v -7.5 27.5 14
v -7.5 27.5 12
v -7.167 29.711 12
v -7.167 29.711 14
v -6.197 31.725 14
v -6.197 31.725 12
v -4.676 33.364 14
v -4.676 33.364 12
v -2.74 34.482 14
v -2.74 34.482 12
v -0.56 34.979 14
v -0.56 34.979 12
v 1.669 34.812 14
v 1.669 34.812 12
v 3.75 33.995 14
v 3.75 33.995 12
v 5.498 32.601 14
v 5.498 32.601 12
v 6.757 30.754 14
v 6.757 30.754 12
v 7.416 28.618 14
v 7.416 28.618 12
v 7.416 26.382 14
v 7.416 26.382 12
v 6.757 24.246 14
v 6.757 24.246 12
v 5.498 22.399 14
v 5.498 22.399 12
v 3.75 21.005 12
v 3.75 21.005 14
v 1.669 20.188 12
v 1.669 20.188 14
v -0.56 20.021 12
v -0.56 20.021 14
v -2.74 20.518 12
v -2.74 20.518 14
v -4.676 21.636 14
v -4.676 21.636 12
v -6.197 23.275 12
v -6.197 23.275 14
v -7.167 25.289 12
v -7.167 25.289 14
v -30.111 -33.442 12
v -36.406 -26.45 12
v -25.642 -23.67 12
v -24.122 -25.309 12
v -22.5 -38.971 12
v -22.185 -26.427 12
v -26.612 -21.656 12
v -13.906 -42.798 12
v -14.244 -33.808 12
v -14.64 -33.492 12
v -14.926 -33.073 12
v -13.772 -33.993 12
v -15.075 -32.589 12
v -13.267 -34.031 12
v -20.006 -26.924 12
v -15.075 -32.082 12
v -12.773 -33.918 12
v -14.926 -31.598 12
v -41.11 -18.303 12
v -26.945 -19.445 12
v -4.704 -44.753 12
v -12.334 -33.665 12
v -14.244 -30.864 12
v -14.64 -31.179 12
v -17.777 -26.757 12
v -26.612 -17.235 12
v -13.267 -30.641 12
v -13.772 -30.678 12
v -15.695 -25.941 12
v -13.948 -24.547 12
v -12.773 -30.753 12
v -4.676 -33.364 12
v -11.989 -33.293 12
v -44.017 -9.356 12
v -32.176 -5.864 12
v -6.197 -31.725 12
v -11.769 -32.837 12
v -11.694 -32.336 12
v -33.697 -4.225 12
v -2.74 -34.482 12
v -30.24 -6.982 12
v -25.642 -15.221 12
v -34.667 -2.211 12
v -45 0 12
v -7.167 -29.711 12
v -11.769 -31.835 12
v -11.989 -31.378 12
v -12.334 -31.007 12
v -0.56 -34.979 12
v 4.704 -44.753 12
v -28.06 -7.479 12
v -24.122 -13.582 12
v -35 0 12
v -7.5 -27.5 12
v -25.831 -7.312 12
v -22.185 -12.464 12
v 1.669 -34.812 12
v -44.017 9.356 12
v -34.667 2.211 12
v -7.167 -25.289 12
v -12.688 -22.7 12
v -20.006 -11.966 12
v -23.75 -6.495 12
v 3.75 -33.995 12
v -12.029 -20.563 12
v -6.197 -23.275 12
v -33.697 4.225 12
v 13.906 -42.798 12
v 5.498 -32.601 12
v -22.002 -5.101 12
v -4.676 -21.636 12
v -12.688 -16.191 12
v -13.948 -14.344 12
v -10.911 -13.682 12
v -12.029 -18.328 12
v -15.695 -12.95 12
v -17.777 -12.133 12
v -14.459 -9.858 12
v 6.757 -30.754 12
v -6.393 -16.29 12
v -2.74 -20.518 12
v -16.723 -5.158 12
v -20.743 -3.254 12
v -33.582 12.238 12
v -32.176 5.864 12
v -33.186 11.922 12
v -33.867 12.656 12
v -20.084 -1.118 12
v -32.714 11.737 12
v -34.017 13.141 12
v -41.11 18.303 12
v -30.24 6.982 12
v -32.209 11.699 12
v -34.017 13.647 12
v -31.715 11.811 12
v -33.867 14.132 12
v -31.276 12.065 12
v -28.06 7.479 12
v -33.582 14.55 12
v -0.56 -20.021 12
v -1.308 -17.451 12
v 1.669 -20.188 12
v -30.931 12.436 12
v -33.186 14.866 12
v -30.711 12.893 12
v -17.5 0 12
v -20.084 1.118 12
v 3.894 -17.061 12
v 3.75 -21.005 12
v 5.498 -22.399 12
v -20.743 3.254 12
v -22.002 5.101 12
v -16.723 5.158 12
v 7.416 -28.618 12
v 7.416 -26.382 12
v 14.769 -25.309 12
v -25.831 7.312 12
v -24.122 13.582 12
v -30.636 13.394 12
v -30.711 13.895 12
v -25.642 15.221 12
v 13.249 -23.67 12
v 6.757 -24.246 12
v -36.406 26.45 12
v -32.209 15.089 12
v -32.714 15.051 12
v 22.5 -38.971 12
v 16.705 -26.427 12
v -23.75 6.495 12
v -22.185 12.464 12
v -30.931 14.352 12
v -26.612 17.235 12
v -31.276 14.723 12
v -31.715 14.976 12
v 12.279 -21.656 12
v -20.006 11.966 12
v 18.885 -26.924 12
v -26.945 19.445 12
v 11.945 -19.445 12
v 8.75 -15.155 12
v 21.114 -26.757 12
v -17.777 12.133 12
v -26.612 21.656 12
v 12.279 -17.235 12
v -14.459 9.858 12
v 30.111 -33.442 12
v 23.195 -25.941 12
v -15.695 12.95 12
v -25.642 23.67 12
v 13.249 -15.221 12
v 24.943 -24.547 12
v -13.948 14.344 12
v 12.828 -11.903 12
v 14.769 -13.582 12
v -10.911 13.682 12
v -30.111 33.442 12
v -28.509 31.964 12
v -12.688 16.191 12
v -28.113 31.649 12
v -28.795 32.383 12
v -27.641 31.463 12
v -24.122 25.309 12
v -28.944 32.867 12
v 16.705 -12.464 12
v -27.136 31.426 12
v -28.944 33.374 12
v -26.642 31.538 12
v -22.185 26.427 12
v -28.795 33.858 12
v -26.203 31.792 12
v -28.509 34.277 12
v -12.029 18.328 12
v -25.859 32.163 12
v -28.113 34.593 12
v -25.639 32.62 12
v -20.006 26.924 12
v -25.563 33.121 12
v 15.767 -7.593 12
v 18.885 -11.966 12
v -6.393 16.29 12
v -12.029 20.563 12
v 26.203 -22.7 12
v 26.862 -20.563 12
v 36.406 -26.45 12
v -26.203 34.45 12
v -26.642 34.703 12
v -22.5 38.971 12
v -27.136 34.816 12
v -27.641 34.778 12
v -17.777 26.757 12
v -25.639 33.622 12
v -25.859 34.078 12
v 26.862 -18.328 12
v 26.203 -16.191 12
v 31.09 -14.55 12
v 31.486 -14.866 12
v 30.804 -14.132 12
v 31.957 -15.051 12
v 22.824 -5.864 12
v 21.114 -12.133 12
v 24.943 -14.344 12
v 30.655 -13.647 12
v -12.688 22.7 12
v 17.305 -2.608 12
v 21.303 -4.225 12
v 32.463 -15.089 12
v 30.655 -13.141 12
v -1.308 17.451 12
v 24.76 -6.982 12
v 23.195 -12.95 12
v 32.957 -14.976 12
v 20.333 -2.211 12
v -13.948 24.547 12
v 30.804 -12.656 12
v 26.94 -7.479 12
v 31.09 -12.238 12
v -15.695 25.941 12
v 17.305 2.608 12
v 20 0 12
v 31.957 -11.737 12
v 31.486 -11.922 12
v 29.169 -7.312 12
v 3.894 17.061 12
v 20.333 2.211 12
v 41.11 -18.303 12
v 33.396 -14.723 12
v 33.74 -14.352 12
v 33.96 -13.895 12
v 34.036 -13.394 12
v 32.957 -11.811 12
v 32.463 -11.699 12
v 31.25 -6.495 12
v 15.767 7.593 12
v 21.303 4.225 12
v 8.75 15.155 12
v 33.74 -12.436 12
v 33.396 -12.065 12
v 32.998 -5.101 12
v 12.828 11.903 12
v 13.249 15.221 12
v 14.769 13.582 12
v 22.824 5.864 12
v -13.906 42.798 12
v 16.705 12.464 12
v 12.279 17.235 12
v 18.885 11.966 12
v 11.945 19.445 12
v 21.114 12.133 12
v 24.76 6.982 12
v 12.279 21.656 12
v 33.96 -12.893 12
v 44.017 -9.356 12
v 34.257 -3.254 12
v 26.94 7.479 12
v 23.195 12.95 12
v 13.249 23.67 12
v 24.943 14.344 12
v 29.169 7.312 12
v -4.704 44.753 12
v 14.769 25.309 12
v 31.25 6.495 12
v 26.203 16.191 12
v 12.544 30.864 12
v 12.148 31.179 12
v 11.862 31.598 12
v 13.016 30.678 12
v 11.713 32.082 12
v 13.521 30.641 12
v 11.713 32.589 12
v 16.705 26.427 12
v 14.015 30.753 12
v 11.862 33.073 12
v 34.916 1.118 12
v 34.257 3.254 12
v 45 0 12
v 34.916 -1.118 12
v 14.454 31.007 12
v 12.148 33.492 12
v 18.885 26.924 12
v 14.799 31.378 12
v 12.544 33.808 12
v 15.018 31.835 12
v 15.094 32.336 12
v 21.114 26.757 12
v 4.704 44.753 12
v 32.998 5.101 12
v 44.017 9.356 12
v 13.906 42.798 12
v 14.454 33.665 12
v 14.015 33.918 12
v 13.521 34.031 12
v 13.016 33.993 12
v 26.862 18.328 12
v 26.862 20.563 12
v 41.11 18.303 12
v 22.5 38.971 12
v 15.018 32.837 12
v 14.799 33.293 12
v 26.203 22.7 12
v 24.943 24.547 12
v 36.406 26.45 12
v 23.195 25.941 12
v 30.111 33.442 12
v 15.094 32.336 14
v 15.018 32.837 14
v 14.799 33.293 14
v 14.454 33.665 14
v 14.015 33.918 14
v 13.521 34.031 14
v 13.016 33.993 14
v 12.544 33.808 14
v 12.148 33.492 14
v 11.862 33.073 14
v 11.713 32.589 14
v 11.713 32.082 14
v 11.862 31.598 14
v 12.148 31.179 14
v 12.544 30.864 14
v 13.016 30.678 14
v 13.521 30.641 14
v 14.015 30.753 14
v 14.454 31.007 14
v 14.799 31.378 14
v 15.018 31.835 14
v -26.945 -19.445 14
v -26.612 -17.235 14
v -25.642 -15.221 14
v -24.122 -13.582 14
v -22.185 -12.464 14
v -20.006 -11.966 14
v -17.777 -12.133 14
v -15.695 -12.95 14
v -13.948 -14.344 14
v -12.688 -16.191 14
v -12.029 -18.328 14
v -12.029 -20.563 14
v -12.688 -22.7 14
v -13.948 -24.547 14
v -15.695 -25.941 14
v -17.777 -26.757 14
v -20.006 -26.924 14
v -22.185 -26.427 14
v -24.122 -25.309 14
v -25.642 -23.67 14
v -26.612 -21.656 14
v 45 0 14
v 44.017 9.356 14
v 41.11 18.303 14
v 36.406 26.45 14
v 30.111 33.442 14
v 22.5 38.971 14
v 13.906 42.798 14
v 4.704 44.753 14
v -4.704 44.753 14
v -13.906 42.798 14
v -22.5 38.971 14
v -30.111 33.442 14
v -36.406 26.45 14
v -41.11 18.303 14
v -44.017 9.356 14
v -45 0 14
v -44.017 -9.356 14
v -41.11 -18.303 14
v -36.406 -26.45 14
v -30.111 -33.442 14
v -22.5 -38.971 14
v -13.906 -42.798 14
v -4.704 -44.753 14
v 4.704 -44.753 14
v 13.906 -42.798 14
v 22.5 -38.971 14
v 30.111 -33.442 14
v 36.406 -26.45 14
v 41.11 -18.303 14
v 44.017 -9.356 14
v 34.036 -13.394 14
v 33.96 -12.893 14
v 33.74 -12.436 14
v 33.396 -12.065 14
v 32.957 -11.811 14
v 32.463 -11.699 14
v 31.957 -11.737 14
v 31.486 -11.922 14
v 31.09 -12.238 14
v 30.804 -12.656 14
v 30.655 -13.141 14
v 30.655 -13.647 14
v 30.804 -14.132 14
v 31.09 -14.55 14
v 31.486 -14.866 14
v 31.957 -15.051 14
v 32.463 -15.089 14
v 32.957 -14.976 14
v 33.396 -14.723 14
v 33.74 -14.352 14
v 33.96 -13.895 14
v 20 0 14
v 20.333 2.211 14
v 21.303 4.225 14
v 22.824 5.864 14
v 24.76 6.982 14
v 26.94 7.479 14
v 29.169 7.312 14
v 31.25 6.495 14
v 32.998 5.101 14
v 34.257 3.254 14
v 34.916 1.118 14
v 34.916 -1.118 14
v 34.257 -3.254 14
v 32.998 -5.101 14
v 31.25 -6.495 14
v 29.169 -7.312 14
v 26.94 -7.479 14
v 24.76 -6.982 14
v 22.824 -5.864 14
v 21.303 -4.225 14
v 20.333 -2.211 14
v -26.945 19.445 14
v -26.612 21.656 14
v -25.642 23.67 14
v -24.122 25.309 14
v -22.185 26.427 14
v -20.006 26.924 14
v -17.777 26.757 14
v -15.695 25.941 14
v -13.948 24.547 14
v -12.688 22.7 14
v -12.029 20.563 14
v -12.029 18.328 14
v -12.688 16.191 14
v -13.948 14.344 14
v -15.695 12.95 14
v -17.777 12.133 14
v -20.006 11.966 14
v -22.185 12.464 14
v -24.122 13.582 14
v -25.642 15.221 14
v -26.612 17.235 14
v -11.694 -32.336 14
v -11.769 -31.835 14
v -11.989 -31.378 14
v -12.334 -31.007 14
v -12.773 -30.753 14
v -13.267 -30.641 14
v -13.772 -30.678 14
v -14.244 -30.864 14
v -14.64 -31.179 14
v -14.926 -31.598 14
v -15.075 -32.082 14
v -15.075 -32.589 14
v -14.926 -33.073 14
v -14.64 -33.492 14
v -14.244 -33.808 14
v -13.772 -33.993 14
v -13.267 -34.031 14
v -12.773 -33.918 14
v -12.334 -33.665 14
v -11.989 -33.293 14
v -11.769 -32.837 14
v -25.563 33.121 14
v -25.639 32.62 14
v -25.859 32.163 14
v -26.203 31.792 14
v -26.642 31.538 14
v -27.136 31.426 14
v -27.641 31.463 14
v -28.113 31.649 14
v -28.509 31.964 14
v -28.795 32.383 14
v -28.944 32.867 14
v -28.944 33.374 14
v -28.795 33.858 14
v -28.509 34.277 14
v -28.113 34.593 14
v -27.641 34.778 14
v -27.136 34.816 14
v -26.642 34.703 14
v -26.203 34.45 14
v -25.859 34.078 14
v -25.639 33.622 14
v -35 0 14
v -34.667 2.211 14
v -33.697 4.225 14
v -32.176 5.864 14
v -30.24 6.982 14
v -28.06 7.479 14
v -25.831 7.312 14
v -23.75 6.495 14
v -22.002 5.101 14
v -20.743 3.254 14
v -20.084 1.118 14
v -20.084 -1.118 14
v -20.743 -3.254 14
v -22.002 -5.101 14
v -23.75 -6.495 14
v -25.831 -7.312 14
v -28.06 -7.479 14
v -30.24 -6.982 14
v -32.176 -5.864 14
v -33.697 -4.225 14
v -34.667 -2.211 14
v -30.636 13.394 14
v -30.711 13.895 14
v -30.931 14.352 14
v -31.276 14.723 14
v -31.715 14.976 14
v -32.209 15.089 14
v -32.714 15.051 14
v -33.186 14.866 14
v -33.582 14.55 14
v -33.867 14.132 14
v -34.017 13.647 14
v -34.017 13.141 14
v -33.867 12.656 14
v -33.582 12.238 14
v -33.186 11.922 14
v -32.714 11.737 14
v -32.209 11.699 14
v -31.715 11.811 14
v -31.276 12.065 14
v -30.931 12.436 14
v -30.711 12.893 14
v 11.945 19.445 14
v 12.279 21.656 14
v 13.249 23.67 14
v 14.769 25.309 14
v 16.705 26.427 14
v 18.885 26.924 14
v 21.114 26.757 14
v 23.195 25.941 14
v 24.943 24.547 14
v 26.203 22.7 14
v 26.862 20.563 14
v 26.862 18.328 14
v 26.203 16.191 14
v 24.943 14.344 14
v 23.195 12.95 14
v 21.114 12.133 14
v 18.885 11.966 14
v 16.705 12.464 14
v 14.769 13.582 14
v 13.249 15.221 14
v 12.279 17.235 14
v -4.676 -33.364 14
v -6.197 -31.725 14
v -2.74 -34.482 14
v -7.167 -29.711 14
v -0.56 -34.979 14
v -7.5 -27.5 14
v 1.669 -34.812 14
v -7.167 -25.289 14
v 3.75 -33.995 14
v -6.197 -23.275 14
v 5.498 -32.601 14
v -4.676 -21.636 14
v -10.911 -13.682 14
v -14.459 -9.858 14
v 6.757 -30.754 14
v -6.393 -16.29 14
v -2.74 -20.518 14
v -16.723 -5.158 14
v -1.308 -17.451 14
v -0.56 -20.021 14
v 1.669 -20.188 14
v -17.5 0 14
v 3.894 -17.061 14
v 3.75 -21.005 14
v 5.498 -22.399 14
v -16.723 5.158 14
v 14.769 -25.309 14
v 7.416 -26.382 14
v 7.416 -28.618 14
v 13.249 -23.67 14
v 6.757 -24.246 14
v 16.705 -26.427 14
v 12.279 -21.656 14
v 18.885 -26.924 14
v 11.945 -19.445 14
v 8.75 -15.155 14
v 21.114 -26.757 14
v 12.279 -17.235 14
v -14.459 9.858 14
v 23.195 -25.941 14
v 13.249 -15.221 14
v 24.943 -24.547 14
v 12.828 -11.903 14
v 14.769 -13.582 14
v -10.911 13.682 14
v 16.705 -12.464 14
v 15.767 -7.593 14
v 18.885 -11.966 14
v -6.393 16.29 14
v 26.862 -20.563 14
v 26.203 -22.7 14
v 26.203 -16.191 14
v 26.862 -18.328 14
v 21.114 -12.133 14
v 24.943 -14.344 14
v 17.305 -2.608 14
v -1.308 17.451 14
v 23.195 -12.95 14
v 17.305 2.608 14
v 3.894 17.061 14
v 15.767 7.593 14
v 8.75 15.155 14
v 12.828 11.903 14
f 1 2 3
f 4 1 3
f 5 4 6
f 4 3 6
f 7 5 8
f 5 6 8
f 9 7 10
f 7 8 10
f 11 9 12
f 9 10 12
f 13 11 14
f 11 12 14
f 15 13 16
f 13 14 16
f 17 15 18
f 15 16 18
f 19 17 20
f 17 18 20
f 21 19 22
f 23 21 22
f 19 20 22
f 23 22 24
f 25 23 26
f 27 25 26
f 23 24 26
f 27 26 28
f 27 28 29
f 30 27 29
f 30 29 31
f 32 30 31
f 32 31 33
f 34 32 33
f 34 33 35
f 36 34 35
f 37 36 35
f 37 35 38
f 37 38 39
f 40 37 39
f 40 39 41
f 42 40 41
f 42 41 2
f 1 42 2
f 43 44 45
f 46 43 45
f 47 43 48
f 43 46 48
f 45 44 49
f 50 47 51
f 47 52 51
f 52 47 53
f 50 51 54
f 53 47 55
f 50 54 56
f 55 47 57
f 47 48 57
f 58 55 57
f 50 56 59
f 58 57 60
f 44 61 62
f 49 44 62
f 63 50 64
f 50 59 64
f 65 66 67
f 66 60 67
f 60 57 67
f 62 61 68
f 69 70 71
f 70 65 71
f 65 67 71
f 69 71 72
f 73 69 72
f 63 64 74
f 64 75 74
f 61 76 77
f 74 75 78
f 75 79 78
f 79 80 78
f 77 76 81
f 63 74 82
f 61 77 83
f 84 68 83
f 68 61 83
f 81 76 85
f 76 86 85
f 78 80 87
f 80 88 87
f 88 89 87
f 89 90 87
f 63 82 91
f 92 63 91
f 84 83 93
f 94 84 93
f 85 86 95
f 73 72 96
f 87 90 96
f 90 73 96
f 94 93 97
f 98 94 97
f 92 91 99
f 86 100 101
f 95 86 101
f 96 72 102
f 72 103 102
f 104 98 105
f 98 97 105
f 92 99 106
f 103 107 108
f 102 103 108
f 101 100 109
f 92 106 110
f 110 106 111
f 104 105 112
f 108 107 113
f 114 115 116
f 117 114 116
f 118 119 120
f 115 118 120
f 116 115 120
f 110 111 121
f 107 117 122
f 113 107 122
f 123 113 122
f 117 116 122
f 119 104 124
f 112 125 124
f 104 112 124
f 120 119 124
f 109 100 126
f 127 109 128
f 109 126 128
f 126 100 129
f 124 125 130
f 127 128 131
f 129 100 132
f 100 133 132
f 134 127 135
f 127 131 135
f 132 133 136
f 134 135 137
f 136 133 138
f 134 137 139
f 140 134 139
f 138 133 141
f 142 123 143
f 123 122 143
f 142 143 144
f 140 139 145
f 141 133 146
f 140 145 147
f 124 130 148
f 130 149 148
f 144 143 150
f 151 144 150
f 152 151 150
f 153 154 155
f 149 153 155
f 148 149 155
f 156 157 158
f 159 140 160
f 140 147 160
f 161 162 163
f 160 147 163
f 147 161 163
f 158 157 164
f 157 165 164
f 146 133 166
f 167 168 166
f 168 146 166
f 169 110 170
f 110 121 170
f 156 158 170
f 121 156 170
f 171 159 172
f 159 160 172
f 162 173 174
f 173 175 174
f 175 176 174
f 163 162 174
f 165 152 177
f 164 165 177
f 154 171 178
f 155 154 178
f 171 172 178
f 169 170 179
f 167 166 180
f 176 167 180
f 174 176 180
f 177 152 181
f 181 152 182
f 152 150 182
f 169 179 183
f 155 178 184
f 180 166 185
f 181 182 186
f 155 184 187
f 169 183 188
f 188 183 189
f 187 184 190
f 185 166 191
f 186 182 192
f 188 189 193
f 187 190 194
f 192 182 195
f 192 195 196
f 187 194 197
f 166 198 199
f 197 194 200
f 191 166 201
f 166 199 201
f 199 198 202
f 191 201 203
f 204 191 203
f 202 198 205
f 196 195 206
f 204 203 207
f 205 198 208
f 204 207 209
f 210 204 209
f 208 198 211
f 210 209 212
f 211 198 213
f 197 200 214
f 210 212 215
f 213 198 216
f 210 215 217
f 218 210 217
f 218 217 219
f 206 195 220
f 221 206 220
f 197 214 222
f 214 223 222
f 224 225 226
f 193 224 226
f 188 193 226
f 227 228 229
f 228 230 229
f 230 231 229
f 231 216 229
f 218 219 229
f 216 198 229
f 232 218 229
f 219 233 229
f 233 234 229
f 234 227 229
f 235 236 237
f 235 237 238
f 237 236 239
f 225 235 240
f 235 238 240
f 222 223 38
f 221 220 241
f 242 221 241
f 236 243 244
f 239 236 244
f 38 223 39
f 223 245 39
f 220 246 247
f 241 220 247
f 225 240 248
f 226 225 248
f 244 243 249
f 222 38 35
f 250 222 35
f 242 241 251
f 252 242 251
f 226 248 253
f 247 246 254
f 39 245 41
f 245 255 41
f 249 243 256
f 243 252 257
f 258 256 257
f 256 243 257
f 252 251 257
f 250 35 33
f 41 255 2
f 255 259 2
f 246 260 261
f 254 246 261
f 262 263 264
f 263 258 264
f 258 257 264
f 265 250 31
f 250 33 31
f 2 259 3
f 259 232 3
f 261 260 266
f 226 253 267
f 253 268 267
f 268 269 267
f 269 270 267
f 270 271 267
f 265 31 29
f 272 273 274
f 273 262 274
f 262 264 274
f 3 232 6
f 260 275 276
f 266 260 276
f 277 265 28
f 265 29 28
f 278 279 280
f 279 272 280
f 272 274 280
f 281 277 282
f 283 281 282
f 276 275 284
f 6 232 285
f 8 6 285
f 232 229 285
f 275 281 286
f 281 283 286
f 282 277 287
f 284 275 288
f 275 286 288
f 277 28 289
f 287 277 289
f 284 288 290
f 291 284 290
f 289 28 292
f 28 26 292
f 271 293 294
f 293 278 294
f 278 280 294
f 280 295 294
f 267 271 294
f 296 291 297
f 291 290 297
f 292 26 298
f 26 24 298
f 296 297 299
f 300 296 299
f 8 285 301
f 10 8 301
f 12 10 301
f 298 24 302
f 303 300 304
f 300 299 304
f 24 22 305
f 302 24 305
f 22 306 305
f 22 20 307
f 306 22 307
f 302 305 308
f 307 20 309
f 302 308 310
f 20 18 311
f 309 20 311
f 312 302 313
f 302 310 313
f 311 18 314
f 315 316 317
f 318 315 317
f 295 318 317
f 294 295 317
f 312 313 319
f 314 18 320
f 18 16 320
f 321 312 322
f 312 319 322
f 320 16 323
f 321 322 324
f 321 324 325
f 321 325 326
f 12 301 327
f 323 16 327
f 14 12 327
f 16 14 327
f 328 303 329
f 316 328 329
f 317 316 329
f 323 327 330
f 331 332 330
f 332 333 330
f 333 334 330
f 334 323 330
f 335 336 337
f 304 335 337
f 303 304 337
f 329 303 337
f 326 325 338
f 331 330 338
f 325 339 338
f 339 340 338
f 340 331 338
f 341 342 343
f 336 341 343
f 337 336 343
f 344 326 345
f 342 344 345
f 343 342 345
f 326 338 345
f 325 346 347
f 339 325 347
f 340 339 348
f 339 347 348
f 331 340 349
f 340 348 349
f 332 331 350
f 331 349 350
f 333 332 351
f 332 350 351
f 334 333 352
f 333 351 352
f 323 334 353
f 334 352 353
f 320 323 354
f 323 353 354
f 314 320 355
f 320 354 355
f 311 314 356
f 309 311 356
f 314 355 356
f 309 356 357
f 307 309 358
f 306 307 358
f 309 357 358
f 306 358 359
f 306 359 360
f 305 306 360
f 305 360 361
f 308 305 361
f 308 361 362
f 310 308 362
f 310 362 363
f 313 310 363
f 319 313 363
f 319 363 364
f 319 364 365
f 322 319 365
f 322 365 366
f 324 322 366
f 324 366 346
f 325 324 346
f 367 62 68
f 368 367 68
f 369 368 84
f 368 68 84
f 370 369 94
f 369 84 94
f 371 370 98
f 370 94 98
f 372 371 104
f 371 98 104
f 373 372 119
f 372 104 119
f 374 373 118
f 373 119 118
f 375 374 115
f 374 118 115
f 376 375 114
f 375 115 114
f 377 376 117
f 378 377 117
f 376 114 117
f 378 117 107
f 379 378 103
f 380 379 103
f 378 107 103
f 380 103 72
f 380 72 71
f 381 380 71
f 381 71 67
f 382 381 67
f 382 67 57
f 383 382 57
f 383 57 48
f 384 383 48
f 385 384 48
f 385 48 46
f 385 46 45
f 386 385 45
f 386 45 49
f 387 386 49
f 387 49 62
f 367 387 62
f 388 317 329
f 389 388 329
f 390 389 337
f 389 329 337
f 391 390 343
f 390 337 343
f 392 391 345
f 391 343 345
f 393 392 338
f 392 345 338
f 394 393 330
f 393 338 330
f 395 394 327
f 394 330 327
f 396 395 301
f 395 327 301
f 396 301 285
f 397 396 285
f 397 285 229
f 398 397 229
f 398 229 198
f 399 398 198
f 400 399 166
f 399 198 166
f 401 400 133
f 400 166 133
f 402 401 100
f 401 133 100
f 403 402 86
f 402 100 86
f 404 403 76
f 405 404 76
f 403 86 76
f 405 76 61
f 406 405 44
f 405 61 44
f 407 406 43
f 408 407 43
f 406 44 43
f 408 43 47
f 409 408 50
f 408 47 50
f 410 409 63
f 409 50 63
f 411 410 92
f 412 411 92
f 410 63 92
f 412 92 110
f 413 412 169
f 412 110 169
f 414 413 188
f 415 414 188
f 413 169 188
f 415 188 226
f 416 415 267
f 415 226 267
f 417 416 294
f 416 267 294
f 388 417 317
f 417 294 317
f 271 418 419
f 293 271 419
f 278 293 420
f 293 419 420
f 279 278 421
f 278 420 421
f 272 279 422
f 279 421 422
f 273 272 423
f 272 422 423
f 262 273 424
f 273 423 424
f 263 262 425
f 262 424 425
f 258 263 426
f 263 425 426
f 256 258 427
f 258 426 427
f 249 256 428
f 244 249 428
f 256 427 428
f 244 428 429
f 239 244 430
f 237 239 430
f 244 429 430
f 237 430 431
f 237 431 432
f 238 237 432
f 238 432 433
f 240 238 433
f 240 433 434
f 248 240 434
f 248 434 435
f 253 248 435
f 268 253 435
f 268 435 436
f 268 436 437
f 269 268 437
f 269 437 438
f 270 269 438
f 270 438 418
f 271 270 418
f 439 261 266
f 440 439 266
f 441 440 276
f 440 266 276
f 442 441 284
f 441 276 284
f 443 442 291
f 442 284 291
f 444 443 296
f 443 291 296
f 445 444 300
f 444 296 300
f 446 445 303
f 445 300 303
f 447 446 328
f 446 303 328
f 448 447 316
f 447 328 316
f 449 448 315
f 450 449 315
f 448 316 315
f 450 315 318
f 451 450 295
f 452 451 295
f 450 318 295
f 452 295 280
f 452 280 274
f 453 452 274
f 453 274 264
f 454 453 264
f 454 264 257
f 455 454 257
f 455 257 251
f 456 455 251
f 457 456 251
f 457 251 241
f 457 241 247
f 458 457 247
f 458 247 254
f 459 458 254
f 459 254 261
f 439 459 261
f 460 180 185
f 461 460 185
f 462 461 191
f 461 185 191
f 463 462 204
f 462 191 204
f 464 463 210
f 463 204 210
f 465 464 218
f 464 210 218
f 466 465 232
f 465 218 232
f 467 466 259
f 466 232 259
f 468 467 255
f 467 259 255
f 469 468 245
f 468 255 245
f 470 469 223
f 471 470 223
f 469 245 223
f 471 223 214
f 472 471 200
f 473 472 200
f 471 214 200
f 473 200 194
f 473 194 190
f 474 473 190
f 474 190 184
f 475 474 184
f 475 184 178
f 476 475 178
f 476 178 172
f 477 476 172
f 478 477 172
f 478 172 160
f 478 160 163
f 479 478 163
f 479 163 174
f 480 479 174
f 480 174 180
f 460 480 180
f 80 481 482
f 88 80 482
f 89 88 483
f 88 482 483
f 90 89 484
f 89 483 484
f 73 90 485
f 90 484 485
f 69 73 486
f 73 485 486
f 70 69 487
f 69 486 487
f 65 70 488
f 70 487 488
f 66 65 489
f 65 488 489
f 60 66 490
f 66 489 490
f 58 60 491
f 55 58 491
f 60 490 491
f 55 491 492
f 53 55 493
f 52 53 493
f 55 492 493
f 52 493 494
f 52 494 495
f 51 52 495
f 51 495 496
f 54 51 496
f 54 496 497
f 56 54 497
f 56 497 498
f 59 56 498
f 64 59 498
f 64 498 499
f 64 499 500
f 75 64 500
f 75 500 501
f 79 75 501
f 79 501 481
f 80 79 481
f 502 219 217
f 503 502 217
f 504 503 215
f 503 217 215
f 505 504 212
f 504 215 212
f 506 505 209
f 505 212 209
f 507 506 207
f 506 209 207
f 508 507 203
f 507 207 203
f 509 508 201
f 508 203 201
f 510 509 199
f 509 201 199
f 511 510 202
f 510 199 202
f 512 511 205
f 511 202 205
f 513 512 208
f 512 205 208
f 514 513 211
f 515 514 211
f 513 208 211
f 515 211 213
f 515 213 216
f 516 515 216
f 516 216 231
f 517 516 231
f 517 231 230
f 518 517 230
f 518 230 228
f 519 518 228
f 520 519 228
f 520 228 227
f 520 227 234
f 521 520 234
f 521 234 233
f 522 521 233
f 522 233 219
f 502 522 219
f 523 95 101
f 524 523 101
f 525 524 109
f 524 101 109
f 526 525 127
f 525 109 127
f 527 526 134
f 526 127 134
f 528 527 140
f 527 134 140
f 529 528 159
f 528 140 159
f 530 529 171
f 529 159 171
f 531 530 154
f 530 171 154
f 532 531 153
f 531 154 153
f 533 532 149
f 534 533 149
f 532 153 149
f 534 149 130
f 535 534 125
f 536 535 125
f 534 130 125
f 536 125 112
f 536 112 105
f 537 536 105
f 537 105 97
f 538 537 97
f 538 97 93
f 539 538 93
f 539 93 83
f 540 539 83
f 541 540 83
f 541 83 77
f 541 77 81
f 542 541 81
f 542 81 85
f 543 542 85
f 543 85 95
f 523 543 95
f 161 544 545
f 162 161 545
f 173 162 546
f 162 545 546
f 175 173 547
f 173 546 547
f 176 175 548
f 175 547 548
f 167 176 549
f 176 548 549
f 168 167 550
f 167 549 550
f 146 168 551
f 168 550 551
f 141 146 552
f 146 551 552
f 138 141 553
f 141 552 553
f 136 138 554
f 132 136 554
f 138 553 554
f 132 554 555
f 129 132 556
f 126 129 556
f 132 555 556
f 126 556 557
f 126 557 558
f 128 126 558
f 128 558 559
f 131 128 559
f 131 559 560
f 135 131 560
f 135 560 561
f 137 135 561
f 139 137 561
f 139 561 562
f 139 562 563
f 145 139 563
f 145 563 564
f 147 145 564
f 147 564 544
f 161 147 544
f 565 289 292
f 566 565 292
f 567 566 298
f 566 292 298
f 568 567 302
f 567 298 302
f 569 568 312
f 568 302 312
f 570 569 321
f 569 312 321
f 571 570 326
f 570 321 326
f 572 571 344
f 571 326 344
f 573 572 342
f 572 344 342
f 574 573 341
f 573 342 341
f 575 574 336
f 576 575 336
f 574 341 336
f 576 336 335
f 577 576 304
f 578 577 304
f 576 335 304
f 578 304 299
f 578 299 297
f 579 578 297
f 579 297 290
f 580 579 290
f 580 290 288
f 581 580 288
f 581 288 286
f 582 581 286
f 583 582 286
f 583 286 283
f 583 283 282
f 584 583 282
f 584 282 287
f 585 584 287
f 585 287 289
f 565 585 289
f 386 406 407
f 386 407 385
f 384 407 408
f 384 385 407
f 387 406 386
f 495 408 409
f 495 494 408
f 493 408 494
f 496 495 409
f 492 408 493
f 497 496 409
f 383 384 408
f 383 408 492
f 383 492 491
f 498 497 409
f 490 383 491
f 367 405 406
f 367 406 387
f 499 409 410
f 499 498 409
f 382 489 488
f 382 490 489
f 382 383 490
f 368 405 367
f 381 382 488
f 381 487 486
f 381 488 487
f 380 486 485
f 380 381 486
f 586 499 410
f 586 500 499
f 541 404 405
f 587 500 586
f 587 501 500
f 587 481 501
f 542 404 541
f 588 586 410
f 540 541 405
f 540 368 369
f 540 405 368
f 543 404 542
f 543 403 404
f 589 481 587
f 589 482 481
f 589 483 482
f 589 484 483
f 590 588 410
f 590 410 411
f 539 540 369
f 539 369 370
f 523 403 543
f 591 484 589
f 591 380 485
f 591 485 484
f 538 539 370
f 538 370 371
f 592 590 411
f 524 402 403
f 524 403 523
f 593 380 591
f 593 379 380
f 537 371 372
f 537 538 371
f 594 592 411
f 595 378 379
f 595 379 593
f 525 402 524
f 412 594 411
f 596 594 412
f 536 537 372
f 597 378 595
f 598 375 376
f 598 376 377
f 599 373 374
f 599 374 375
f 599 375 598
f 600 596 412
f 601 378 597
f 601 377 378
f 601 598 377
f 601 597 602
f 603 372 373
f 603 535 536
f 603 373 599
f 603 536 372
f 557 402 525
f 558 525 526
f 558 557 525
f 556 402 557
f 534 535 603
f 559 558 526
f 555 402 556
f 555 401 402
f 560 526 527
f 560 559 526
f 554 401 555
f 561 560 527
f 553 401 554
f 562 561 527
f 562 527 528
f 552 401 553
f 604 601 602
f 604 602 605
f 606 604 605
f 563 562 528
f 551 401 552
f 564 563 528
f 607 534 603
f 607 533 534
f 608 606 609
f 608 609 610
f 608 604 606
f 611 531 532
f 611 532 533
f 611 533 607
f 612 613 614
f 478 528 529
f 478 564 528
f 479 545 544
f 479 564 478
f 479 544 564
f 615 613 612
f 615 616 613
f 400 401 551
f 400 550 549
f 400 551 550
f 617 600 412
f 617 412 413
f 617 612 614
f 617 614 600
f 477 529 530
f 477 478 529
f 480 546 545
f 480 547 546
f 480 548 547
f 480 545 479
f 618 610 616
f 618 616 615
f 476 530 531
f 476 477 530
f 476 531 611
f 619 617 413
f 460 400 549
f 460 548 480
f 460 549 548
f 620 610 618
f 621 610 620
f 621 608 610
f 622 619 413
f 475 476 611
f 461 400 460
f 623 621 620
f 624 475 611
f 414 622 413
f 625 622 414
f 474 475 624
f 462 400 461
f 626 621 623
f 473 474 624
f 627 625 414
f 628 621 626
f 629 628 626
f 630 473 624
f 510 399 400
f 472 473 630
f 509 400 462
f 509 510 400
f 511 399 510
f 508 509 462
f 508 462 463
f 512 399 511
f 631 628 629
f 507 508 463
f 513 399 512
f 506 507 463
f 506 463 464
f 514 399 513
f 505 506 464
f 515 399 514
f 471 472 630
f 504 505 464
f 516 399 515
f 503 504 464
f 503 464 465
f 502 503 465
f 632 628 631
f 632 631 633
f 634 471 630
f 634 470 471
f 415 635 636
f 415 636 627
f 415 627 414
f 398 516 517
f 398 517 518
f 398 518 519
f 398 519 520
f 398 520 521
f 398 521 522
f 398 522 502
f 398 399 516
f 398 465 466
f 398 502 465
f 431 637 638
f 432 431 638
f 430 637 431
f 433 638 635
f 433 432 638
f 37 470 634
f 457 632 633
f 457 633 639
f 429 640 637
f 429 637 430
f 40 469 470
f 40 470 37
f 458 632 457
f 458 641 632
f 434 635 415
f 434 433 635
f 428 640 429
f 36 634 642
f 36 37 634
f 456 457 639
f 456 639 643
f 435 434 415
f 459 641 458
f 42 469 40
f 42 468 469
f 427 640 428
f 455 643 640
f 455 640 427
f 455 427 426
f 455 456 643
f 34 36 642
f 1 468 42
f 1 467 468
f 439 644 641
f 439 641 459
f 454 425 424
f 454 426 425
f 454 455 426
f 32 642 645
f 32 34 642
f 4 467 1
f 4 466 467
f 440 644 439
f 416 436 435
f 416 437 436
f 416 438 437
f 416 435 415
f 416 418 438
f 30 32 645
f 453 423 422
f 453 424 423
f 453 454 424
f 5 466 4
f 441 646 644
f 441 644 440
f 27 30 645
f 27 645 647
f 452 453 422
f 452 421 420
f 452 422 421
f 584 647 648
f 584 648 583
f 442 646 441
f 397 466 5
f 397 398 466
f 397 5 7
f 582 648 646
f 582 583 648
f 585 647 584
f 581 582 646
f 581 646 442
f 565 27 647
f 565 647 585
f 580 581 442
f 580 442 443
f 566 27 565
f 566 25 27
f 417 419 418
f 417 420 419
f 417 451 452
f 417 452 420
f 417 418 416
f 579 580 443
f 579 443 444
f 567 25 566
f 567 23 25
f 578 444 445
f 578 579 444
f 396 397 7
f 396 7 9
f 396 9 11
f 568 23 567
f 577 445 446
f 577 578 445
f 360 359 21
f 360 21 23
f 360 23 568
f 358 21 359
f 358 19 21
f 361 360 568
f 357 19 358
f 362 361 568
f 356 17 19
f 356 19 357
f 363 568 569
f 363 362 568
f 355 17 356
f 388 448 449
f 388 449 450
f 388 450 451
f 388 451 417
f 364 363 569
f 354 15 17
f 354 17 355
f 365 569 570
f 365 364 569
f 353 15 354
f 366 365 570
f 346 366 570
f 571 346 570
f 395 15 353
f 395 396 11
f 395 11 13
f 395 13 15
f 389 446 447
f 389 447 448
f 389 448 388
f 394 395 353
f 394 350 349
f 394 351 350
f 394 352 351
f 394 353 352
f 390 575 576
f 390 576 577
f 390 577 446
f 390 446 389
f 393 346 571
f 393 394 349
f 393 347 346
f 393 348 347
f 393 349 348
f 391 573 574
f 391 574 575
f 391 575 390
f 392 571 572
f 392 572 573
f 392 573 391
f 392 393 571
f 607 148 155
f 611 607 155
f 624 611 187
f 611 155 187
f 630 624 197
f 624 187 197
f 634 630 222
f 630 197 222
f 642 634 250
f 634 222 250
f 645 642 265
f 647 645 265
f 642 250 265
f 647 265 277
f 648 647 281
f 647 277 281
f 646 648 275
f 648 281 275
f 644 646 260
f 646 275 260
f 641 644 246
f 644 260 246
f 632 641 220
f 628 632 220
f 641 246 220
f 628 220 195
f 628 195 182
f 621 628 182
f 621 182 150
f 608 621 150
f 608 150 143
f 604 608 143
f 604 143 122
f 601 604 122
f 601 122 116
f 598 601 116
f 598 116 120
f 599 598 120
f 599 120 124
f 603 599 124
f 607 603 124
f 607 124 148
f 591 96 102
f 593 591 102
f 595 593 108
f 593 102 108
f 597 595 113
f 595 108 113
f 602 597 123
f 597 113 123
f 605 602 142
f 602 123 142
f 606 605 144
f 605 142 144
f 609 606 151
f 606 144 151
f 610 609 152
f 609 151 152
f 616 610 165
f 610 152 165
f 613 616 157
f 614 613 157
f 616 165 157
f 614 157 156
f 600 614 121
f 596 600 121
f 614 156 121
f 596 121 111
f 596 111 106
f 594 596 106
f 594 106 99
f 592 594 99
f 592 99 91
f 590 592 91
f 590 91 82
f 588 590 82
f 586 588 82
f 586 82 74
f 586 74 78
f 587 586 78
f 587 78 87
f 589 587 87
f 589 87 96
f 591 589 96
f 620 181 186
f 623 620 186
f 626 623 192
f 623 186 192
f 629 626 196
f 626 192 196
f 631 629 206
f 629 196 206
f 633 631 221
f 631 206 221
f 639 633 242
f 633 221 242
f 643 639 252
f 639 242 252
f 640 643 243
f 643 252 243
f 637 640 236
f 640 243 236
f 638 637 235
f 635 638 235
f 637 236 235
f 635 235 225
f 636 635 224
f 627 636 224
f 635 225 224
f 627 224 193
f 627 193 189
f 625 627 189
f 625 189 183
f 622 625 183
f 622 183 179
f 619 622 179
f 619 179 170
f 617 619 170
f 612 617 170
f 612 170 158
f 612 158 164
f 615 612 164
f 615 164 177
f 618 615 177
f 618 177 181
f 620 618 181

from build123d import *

# Parameters (mm, degrees)
SKETCH_1_R          = 40
EXTRUDE_1_DEPTH     = 12
SKETCH_8_R          = 45
EXTRUDE_3_DEPTH     = 2
SKETCH_2_R          = 7.5
CUT_EXTRUDE_1_DEPTH = 66.161338231
HOLE_WIZARD_M31_D   = 3.4
HOLE_WIZARD_M32_D   = 3.4
SKETCH_10_R         = 7.5
CUT_EXTRUDE_2_DEPTH = 66.161338231
HOLE_WIZARD_M33_D   = 3.4
SKETCH_17_R         = 17
CUT_EXTRUDE_3_DEPTH = 1.5
SKETCH_18_R         = 44.163841719
CUT_EXTRUDE_4_DEPTH = 12
SKETCH_19_R         = 17.5
CUT_EXTRUDE_5_DEPTH = 64.671029519


with BuildPart() as part:
    # Эскиз1 → Бобышка-Вытянуть1 (new body)
    with BuildSketch(Plane.XY):
        Circle(SKETCH_1_R)
    extrude(amount=EXTRUDE_1_DEPTH)

    # Эскиз8 → Бобышка-Вытянуть3 (add)
    with BuildSketch(Plane.XY.offset(12)):
        Circle(SKETCH_8_R)
    extrude(amount=EXTRUDE_3_DEPTH)

    # Эскиз2 → Вырез-Вытянуть1 (cut, through all)
    with BuildSketch(Plane(origin=(0, 0, 14), x_dir=(-1, 0, 0), z_dir=(0, 0, -1))):
        Circle(SKETCH_2_R)
    extrude(amount=CUT_EXTRUDE_1_DEPTH, mode=Mode.SUBTRACT)

    # Отверстие с зазором M31 (through all)
    with Locations(Plane(origin=(-6.663493146, -3.889871465, 14), x_dir=(-1, 0, 0), z_dir=(0, 0, 1))):
        with Locations((20.599623529, -37.010635762)):
            Hole(HOLE_WIZARD_M31_D / 2)

    # Отверстие с зазором M32 (through all)
    with Locations(Plane.XY.offset(14)):
        with Locations((0, 12.5), (-12.5, 0), (0, -12.5), (12.5, 0)):
            Hole(HOLE_WIZARD_M32_D / 2)

    # Эскиз10 → Вырез-Вытянуть2 (cut, through all)
    with BuildSketch(Plane(origin=(0, 0, 0), x_dir=(-1, 0, 0), z_dir=(0, 0, -1))):
        with Locations((0, 27.5)):
            Circle(SKETCH_10_R)
        with Locations((19.445436483, 19.445436483)):
            Circle(SKETCH_10_R)
        with Locations((27.5, 0)):
            Circle(SKETCH_10_R)
        with Locations((19.445436483, -19.445436483)):
            Circle(SKETCH_10_R)
        with Locations((0, -27.5)):
            Circle(SKETCH_10_R)
        with Locations((-19.445436483, -19.445436483)):
            Circle(SKETCH_10_R)
        with Locations((-27.5, 0)):
            Circle(SKETCH_10_R)
        with Locations((-19.445436483, 19.445436483)):
            Circle(SKETCH_10_R)
    extrude(amount=-CUT_EXTRUDE_2_DEPTH, mode=Mode.SUBTRACT)

    # Отверстие с зазором M33 (through all)
    with Locations(Plane(origin=(0, 0, 0), x_dir=(-1, 0, 0), z_dir=(0, 0, -1))):
        with Locations((-13.393920133, 32.335783638), (13.393920133, -32.335783638), (32.335783638, 13.393920133), (-32.335783638, -13.393920133)):
            Hole(HOLE_WIZARD_M33_D / 2)

    # Эскиз17 → Вырез-Вытянуть3 (cut)
    with BuildSketch(Plane(origin=(0, 0, 0), x_dir=(-1, 0, 0), z_dir=(0, 0, -1))):
        Circle(SKETCH_17_R)
    extrude(amount=-CUT_EXTRUDE_3_DEPTH, mode=Mode.SUBTRACT)

    # Эскиз18 → Вырез-Вытянуть4 (cut)
    with BuildSketch(Plane(origin=(0, 0, 0), x_dir=(-1, 0, 0), z_dir=(0, 0, -1))):
        Circle(SKETCH_18_R)
    extrude(amount=-CUT_EXTRUDE_4_DEPTH, mode=Mode.SUBTRACT)

    # Эскиз19 → Вырез-Вытянуть5 (cut, through all)
    with BuildSketch(Plane(origin=(0, 0, 12), x_dir=(-1, 0, 0), z_dir=(0, 0, -1))):
        Circle(SKETCH_19_R)
    extrude(amount=-CUT_EXTRUDE_5_DEPTH, mode=Mode.SUBTRACT)


solid = part.part
